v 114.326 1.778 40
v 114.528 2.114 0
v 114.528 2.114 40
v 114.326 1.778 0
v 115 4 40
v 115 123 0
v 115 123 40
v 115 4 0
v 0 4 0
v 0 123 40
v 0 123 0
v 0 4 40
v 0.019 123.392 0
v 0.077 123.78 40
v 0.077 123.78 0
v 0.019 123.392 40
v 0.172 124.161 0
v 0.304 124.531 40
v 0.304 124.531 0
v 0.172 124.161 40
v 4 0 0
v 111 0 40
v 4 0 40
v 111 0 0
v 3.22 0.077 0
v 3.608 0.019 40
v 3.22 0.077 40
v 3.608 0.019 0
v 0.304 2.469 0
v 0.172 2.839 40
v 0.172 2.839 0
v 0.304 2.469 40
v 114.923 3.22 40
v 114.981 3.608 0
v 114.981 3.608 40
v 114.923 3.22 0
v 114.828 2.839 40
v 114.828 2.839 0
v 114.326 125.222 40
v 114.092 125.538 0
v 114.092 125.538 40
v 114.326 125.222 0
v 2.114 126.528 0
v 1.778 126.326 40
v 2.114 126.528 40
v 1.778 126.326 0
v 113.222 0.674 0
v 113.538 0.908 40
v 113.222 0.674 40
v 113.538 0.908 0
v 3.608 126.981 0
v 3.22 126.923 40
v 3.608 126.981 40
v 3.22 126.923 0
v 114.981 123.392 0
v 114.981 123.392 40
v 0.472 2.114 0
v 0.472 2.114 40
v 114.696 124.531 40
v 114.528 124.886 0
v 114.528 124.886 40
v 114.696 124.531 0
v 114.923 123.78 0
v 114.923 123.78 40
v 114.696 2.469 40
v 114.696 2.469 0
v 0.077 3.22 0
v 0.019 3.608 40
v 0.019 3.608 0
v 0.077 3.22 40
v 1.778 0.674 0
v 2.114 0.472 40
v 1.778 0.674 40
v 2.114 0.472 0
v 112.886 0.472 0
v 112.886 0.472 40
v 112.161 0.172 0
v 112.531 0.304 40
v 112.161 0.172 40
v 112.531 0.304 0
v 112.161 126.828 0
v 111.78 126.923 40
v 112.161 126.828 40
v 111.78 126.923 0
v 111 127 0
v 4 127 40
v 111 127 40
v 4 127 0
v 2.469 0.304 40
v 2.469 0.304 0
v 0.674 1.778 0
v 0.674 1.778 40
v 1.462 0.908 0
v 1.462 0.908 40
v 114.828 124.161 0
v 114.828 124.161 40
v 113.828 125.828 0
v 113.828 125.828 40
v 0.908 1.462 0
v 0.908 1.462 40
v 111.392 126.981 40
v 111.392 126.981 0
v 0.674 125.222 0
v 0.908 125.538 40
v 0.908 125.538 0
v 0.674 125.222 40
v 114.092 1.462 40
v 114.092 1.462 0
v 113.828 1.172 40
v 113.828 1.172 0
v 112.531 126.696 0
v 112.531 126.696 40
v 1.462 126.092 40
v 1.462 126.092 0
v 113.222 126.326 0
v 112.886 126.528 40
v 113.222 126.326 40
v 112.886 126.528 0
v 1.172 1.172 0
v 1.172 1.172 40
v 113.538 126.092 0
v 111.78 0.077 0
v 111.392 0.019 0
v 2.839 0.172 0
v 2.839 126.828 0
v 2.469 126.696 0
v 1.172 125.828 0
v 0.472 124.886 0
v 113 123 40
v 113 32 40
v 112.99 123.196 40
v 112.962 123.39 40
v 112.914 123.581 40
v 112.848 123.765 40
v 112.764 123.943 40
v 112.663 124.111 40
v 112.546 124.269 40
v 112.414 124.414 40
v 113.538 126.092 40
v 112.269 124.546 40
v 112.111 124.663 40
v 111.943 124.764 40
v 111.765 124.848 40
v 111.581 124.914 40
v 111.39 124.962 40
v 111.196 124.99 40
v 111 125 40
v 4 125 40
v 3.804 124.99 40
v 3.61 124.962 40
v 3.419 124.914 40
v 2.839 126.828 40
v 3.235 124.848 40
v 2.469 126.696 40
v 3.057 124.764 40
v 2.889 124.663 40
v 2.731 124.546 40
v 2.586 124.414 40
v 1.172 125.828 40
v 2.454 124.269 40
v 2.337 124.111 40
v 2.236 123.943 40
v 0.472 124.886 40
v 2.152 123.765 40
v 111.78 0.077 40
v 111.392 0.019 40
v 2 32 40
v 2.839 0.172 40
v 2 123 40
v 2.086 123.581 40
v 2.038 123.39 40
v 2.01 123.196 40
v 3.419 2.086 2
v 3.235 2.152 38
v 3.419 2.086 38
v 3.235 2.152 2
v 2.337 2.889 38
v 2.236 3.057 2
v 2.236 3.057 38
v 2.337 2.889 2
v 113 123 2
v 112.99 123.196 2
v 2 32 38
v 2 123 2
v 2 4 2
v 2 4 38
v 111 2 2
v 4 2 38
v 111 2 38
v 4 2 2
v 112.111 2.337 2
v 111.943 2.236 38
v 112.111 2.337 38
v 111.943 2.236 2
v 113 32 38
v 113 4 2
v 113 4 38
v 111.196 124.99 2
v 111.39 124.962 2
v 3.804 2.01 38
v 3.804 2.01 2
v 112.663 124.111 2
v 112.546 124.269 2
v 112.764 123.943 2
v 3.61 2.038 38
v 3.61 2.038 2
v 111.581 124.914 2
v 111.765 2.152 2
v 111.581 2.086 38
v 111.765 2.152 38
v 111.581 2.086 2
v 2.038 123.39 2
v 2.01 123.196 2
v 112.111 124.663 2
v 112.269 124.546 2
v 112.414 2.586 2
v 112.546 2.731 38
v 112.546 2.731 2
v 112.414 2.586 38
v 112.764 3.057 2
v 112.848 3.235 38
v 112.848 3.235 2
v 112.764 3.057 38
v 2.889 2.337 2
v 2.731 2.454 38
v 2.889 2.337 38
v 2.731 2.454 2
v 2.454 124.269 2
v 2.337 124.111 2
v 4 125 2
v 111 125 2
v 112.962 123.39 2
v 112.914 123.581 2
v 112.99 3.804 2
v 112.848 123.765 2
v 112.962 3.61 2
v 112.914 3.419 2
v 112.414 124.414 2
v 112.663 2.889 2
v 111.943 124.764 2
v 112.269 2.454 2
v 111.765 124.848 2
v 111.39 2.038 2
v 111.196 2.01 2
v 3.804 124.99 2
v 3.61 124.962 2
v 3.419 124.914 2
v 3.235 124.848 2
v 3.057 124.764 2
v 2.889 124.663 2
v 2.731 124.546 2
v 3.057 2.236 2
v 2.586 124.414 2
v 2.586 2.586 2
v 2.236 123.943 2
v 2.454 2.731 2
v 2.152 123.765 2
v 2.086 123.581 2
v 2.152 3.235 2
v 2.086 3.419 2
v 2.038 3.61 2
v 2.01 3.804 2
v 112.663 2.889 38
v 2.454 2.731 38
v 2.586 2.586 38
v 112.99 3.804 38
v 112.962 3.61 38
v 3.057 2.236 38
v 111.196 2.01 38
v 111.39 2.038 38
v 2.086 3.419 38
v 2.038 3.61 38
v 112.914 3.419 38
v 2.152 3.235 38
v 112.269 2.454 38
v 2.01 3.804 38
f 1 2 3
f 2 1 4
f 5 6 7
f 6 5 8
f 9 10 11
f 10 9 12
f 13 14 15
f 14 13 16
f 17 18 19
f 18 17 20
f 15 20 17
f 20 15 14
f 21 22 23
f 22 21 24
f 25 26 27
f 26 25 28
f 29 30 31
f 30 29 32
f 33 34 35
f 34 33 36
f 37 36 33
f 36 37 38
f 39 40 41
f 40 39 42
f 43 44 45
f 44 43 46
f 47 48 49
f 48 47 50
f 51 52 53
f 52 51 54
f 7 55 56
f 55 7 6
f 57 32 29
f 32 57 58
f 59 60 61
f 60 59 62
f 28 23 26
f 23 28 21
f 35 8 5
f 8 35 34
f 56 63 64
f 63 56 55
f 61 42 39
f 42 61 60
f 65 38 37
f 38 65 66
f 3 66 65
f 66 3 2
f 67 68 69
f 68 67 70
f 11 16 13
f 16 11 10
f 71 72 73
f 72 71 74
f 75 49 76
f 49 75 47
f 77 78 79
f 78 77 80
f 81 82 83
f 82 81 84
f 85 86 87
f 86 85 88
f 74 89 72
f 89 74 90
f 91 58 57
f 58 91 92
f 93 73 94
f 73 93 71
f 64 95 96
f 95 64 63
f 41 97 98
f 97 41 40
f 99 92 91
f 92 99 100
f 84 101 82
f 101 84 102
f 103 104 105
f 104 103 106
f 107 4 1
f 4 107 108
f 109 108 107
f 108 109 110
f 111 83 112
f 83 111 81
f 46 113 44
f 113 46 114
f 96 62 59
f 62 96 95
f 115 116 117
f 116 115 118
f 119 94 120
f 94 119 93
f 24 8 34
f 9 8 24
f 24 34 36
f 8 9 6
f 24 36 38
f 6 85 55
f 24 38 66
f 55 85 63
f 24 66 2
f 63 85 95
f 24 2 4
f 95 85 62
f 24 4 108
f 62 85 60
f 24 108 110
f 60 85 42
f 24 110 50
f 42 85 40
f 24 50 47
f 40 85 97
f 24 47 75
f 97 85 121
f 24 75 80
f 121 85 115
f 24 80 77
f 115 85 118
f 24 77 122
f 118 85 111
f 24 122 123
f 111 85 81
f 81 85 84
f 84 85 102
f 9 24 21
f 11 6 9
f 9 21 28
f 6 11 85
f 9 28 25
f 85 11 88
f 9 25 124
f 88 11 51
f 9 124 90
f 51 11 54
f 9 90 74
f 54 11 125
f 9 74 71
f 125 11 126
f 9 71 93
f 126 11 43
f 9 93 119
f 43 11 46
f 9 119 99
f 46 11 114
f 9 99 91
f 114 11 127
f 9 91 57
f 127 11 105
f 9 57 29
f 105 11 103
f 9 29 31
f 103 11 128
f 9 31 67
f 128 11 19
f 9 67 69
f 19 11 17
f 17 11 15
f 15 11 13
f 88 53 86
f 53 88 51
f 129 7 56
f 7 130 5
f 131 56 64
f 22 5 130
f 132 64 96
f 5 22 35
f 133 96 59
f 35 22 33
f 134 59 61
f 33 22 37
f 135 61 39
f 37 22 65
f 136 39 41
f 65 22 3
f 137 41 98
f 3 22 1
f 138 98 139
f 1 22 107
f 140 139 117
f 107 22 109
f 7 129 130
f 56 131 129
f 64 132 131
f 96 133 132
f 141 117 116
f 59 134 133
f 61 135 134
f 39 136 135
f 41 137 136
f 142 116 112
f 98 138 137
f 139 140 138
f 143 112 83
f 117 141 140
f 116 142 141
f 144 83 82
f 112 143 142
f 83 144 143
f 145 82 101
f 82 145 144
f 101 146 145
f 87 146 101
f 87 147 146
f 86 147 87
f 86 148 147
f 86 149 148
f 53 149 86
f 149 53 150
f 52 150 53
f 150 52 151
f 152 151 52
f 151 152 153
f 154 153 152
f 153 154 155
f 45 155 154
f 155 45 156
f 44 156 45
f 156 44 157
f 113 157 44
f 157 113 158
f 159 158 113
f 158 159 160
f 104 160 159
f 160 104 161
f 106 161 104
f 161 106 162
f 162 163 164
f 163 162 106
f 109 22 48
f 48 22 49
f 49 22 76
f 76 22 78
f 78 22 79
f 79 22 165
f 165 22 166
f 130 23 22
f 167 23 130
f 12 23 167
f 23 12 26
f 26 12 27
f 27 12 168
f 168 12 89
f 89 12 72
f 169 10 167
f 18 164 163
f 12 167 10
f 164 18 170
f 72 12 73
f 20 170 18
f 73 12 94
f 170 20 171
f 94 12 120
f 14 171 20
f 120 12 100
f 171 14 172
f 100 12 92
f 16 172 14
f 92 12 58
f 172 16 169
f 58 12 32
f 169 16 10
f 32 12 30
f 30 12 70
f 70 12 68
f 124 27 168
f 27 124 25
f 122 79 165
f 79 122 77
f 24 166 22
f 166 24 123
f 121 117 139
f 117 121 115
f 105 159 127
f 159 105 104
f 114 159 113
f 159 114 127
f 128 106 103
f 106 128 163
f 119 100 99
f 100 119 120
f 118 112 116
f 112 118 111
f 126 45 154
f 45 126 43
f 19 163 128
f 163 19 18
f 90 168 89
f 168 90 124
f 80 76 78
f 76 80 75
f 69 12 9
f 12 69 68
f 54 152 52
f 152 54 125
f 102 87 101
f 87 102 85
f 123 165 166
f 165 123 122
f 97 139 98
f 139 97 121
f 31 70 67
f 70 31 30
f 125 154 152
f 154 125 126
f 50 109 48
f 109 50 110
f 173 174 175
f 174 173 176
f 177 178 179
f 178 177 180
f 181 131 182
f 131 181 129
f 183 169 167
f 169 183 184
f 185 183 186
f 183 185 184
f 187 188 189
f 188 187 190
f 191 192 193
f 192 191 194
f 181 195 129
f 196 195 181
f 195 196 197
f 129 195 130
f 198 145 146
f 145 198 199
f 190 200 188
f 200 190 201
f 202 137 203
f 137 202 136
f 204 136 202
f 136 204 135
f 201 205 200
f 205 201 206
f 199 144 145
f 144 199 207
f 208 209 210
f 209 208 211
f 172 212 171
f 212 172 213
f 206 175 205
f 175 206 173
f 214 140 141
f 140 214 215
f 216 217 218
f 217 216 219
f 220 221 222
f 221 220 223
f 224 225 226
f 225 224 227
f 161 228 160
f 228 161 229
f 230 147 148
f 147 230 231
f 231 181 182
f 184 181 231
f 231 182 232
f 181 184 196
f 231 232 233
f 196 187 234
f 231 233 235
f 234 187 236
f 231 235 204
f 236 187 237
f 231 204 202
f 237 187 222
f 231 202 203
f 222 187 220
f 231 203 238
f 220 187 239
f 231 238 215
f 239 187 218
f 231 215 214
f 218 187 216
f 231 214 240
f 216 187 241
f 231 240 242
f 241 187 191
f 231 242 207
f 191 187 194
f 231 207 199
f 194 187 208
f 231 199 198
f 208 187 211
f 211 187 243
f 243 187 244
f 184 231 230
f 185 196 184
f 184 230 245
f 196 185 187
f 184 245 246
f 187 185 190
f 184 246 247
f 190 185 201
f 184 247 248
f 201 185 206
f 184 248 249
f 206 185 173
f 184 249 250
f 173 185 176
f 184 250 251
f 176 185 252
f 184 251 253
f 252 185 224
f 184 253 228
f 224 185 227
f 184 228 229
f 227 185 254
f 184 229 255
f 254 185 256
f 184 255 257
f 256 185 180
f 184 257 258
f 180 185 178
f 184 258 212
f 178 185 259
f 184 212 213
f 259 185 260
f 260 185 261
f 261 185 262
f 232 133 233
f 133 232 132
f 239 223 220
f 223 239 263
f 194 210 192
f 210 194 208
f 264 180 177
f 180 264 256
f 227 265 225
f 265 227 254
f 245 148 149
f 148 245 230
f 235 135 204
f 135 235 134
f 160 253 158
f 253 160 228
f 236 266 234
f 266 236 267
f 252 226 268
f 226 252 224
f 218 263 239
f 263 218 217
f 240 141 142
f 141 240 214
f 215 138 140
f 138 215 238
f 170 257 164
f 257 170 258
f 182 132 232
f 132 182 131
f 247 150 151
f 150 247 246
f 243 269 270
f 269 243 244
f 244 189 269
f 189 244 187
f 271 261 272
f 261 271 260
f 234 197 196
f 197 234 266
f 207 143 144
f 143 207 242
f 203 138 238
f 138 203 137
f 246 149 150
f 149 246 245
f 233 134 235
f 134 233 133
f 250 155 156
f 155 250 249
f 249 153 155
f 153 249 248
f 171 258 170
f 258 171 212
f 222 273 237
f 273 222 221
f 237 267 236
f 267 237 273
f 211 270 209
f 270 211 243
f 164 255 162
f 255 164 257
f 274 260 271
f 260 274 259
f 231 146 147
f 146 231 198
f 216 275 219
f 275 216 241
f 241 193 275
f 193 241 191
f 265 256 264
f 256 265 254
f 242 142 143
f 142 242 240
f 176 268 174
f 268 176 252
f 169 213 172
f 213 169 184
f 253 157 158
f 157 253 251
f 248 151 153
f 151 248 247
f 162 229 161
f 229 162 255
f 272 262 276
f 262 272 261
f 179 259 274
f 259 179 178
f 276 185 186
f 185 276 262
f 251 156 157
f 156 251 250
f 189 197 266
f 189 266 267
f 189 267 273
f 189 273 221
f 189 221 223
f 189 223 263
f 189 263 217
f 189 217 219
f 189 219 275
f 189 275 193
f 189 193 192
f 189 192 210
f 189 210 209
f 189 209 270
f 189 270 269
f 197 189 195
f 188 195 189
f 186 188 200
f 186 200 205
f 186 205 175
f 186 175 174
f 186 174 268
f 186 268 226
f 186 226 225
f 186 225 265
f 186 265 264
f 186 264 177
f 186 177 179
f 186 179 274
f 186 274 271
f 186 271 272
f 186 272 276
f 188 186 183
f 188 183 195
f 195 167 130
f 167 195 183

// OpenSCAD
// Open-top box with rounded vertical corners and a partial top cover
length = 115;   // mm
width  = 127;   // mm
height = 40;    // mm
wall   = 2;       // wall and floor thickness
r      = 4;       // outer corner radius (must be greater than wall)

cover_width = 32;    // how far the cover extends inward from the long wall
cover_thick = wall;  // cover thickness, flush with the top

$fn = 64;

// Rounded rectangle extruded to a height
module rounded_box(l, w, h, rad) {
    hull() {
        for (x = [rad, l - rad], y = [rad, w - rad])
            translate([x, y, 0])
                cylinder(r = rad, h = h);
    }
}

union() {
    // the box
    difference() {
        rounded_box(length, width, height, r);

        translate([wall, wall, wall])
            rounded_box(length - 2*wall, width - 2*wall, height, r - wall);
    }

    // [cover:begin]
    // partial top cover, trimmed to the rounded outline
    intersection() {
        rounded_box(length, width, height, r);
        translate([0, 0, height - cover_thick])
            cube([length, cover_width, cover_thick]);
    }
    // [cover:end]
}
